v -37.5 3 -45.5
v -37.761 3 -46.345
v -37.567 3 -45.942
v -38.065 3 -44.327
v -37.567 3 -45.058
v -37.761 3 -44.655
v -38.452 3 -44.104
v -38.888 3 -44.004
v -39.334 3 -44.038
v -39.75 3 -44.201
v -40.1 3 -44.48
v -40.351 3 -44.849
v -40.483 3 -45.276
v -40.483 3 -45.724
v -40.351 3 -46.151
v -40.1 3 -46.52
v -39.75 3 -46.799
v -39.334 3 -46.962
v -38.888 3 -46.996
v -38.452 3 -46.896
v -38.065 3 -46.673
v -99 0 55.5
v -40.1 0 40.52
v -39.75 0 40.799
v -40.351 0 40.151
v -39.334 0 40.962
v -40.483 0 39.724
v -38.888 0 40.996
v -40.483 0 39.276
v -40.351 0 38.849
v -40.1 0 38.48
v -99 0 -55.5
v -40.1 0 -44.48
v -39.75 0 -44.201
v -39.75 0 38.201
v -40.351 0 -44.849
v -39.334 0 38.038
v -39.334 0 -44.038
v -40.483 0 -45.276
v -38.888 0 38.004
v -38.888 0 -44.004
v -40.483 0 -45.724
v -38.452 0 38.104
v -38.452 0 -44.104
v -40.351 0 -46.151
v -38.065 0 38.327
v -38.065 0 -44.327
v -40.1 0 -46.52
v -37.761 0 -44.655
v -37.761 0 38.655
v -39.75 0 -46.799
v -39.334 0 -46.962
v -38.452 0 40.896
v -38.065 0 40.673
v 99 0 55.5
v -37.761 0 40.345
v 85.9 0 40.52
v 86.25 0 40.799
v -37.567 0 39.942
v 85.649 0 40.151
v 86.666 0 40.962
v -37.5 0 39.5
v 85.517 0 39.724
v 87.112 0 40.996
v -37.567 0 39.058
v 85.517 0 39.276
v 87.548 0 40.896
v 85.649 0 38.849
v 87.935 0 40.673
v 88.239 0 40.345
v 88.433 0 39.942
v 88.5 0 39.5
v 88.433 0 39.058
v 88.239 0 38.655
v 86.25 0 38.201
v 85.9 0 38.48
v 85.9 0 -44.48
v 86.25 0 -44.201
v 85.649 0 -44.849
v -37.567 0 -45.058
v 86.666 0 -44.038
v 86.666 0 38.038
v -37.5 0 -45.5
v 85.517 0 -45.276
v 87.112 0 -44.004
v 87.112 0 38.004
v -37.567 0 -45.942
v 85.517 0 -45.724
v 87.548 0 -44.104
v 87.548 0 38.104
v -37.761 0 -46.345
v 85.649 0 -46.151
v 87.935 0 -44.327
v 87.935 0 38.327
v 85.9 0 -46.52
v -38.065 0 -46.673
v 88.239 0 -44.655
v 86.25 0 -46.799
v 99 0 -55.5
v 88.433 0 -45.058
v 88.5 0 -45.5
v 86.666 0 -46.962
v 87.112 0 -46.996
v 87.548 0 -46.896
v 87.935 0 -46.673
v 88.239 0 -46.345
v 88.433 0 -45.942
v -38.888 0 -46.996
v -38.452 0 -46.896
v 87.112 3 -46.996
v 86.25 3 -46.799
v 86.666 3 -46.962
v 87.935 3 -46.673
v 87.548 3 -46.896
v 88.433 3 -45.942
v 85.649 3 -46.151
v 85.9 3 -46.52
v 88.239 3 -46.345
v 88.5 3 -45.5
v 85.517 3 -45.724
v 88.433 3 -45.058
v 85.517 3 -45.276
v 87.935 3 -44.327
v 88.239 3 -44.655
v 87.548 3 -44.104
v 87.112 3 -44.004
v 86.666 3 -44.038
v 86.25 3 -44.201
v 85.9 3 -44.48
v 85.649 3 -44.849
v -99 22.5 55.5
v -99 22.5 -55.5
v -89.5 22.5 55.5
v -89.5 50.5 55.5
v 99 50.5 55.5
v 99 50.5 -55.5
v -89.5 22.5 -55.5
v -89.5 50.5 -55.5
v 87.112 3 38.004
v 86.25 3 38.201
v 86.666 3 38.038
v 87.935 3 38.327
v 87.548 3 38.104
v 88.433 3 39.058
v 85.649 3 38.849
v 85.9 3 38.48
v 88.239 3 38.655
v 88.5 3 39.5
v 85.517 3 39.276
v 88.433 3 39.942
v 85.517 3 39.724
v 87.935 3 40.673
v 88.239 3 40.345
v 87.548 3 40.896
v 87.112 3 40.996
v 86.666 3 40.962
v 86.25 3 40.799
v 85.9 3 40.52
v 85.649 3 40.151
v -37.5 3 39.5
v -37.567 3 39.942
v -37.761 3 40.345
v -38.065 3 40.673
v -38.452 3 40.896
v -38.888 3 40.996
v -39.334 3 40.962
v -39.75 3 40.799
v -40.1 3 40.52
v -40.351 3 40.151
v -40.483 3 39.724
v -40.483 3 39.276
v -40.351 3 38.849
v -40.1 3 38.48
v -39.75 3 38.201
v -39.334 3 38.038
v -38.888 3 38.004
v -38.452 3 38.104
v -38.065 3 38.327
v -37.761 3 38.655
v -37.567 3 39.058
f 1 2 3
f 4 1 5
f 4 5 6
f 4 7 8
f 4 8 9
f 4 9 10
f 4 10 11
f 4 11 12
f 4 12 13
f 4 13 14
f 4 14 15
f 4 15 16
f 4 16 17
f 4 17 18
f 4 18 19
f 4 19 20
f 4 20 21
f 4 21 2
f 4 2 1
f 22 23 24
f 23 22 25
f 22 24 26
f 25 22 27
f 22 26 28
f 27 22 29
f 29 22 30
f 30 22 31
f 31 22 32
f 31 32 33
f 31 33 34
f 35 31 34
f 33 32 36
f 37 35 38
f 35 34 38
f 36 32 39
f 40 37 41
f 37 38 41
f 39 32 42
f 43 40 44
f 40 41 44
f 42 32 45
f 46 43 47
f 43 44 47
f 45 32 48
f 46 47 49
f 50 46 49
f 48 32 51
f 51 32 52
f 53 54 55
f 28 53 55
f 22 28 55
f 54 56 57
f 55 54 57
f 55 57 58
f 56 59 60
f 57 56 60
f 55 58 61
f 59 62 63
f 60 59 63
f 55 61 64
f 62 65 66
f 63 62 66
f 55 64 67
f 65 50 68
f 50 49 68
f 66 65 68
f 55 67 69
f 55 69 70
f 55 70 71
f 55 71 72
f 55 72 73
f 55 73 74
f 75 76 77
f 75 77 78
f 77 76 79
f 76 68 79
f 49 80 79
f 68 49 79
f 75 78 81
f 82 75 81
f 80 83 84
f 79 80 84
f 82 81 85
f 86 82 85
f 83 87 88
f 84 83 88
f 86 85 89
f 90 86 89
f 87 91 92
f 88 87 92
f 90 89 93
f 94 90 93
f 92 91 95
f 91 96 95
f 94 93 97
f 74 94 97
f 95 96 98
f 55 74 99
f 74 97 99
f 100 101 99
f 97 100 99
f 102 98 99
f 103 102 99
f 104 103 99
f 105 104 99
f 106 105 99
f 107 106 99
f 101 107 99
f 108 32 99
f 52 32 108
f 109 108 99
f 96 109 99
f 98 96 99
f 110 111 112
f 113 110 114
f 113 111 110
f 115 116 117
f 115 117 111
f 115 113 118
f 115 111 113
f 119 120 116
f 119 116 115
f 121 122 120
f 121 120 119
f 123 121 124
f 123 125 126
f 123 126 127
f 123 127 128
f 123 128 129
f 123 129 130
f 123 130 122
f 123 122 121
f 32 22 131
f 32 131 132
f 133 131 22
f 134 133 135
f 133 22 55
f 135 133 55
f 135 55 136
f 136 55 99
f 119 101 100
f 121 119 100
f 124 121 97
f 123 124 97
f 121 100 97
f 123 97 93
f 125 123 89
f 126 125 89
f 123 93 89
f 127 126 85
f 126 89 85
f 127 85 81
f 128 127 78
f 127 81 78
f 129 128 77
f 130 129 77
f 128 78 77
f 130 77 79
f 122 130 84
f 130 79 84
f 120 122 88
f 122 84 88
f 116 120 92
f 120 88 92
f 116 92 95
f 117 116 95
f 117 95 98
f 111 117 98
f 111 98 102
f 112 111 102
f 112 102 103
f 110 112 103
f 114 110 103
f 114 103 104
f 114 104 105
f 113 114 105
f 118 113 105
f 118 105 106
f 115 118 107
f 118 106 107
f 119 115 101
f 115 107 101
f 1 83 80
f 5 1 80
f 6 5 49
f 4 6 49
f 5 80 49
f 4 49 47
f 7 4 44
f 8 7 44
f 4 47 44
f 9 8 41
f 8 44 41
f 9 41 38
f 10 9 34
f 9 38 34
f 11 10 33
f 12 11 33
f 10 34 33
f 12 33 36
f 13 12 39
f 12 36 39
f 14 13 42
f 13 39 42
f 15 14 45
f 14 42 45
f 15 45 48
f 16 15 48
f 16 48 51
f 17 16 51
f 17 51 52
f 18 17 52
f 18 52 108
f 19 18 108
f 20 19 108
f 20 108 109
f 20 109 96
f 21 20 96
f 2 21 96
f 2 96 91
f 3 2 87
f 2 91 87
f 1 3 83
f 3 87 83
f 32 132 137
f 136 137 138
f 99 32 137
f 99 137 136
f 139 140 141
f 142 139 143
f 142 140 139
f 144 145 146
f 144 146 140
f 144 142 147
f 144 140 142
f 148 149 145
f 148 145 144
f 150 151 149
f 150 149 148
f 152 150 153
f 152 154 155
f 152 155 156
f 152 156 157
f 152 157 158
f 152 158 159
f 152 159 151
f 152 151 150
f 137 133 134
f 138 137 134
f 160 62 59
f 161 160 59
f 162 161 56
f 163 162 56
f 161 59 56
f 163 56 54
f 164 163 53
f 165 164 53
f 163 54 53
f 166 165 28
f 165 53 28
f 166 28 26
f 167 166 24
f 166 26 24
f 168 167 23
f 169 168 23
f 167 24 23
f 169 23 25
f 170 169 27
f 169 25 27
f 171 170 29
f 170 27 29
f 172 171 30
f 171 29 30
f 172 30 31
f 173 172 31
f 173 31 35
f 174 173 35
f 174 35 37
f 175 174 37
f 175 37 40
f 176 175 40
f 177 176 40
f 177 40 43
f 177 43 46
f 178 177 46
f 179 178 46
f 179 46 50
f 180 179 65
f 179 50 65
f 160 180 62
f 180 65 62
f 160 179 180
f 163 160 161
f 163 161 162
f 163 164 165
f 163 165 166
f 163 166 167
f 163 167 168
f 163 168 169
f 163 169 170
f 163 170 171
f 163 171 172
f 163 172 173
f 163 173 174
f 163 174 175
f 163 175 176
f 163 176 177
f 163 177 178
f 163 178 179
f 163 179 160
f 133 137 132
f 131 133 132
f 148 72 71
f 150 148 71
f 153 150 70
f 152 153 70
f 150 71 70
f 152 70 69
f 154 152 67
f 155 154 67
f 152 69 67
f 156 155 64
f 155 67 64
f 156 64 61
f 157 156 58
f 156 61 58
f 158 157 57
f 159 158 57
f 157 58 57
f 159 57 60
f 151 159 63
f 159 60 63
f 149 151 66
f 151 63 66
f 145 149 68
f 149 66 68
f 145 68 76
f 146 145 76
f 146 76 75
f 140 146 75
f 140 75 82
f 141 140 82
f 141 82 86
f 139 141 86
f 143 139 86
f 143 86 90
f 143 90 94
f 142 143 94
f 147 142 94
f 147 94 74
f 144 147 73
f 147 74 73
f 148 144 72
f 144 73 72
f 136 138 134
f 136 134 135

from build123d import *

# Parameters (mm, degrees)
SKETCH1_W           = 198
SKETCH1_H           = 111
BOSS_EXTRUDE1_DEPTH = 50.5
SKETCH2_W           = 9.5
SKETCH2_H           = 28
CUT_EXTRUDE1_DEPTH  = 147.5
SKETCH4_R           = 1.5
CUT_EXTRUDE2_DEPTH  = 3


with BuildPart() as part:
    # Sketch1 → Boss-Extrude1 (new body)
    with BuildSketch(Plane(origin=(0, 0, 0), x_dir=(1, 0, 0), z_dir=(0, 1, 0))):
        Rectangle(SKETCH1_W, SKETCH1_H)
    extrude(amount=BOSS_EXTRUDE1_DEPTH)

    # Sketch2 → Cut-Extrude1 (cut)
    with BuildSketch(Plane(origin=(0, 0, -55.5), x_dir=(-1, 0, 0), z_dir=(0, 0, -1))):
        with Locations((94.25, 36.5)):
            Rectangle(SKETCH2_W, SKETCH2_H)
    extrude(amount=-CUT_EXTRUDE1_DEPTH, mode=Mode.SUBTRACT)

    # Sketch4 → Cut-Extrude2 (cut)
    with BuildSketch(Plane.XZ):
        with Locations((87, 39.5)):
            Circle(SKETCH4_R)
        with Locations((87, -45.5)):
            Circle(SKETCH4_R)
        with Locations((-39, 39.5)):
            Circle(SKETCH4_R)
        with Locations((-39, -45.5)):
            Circle(SKETCH4_R)
    extrude(amount=-CUT_EXTRUDE2_DEPTH, mode=Mode.SUBTRACT)


solid = part.part
